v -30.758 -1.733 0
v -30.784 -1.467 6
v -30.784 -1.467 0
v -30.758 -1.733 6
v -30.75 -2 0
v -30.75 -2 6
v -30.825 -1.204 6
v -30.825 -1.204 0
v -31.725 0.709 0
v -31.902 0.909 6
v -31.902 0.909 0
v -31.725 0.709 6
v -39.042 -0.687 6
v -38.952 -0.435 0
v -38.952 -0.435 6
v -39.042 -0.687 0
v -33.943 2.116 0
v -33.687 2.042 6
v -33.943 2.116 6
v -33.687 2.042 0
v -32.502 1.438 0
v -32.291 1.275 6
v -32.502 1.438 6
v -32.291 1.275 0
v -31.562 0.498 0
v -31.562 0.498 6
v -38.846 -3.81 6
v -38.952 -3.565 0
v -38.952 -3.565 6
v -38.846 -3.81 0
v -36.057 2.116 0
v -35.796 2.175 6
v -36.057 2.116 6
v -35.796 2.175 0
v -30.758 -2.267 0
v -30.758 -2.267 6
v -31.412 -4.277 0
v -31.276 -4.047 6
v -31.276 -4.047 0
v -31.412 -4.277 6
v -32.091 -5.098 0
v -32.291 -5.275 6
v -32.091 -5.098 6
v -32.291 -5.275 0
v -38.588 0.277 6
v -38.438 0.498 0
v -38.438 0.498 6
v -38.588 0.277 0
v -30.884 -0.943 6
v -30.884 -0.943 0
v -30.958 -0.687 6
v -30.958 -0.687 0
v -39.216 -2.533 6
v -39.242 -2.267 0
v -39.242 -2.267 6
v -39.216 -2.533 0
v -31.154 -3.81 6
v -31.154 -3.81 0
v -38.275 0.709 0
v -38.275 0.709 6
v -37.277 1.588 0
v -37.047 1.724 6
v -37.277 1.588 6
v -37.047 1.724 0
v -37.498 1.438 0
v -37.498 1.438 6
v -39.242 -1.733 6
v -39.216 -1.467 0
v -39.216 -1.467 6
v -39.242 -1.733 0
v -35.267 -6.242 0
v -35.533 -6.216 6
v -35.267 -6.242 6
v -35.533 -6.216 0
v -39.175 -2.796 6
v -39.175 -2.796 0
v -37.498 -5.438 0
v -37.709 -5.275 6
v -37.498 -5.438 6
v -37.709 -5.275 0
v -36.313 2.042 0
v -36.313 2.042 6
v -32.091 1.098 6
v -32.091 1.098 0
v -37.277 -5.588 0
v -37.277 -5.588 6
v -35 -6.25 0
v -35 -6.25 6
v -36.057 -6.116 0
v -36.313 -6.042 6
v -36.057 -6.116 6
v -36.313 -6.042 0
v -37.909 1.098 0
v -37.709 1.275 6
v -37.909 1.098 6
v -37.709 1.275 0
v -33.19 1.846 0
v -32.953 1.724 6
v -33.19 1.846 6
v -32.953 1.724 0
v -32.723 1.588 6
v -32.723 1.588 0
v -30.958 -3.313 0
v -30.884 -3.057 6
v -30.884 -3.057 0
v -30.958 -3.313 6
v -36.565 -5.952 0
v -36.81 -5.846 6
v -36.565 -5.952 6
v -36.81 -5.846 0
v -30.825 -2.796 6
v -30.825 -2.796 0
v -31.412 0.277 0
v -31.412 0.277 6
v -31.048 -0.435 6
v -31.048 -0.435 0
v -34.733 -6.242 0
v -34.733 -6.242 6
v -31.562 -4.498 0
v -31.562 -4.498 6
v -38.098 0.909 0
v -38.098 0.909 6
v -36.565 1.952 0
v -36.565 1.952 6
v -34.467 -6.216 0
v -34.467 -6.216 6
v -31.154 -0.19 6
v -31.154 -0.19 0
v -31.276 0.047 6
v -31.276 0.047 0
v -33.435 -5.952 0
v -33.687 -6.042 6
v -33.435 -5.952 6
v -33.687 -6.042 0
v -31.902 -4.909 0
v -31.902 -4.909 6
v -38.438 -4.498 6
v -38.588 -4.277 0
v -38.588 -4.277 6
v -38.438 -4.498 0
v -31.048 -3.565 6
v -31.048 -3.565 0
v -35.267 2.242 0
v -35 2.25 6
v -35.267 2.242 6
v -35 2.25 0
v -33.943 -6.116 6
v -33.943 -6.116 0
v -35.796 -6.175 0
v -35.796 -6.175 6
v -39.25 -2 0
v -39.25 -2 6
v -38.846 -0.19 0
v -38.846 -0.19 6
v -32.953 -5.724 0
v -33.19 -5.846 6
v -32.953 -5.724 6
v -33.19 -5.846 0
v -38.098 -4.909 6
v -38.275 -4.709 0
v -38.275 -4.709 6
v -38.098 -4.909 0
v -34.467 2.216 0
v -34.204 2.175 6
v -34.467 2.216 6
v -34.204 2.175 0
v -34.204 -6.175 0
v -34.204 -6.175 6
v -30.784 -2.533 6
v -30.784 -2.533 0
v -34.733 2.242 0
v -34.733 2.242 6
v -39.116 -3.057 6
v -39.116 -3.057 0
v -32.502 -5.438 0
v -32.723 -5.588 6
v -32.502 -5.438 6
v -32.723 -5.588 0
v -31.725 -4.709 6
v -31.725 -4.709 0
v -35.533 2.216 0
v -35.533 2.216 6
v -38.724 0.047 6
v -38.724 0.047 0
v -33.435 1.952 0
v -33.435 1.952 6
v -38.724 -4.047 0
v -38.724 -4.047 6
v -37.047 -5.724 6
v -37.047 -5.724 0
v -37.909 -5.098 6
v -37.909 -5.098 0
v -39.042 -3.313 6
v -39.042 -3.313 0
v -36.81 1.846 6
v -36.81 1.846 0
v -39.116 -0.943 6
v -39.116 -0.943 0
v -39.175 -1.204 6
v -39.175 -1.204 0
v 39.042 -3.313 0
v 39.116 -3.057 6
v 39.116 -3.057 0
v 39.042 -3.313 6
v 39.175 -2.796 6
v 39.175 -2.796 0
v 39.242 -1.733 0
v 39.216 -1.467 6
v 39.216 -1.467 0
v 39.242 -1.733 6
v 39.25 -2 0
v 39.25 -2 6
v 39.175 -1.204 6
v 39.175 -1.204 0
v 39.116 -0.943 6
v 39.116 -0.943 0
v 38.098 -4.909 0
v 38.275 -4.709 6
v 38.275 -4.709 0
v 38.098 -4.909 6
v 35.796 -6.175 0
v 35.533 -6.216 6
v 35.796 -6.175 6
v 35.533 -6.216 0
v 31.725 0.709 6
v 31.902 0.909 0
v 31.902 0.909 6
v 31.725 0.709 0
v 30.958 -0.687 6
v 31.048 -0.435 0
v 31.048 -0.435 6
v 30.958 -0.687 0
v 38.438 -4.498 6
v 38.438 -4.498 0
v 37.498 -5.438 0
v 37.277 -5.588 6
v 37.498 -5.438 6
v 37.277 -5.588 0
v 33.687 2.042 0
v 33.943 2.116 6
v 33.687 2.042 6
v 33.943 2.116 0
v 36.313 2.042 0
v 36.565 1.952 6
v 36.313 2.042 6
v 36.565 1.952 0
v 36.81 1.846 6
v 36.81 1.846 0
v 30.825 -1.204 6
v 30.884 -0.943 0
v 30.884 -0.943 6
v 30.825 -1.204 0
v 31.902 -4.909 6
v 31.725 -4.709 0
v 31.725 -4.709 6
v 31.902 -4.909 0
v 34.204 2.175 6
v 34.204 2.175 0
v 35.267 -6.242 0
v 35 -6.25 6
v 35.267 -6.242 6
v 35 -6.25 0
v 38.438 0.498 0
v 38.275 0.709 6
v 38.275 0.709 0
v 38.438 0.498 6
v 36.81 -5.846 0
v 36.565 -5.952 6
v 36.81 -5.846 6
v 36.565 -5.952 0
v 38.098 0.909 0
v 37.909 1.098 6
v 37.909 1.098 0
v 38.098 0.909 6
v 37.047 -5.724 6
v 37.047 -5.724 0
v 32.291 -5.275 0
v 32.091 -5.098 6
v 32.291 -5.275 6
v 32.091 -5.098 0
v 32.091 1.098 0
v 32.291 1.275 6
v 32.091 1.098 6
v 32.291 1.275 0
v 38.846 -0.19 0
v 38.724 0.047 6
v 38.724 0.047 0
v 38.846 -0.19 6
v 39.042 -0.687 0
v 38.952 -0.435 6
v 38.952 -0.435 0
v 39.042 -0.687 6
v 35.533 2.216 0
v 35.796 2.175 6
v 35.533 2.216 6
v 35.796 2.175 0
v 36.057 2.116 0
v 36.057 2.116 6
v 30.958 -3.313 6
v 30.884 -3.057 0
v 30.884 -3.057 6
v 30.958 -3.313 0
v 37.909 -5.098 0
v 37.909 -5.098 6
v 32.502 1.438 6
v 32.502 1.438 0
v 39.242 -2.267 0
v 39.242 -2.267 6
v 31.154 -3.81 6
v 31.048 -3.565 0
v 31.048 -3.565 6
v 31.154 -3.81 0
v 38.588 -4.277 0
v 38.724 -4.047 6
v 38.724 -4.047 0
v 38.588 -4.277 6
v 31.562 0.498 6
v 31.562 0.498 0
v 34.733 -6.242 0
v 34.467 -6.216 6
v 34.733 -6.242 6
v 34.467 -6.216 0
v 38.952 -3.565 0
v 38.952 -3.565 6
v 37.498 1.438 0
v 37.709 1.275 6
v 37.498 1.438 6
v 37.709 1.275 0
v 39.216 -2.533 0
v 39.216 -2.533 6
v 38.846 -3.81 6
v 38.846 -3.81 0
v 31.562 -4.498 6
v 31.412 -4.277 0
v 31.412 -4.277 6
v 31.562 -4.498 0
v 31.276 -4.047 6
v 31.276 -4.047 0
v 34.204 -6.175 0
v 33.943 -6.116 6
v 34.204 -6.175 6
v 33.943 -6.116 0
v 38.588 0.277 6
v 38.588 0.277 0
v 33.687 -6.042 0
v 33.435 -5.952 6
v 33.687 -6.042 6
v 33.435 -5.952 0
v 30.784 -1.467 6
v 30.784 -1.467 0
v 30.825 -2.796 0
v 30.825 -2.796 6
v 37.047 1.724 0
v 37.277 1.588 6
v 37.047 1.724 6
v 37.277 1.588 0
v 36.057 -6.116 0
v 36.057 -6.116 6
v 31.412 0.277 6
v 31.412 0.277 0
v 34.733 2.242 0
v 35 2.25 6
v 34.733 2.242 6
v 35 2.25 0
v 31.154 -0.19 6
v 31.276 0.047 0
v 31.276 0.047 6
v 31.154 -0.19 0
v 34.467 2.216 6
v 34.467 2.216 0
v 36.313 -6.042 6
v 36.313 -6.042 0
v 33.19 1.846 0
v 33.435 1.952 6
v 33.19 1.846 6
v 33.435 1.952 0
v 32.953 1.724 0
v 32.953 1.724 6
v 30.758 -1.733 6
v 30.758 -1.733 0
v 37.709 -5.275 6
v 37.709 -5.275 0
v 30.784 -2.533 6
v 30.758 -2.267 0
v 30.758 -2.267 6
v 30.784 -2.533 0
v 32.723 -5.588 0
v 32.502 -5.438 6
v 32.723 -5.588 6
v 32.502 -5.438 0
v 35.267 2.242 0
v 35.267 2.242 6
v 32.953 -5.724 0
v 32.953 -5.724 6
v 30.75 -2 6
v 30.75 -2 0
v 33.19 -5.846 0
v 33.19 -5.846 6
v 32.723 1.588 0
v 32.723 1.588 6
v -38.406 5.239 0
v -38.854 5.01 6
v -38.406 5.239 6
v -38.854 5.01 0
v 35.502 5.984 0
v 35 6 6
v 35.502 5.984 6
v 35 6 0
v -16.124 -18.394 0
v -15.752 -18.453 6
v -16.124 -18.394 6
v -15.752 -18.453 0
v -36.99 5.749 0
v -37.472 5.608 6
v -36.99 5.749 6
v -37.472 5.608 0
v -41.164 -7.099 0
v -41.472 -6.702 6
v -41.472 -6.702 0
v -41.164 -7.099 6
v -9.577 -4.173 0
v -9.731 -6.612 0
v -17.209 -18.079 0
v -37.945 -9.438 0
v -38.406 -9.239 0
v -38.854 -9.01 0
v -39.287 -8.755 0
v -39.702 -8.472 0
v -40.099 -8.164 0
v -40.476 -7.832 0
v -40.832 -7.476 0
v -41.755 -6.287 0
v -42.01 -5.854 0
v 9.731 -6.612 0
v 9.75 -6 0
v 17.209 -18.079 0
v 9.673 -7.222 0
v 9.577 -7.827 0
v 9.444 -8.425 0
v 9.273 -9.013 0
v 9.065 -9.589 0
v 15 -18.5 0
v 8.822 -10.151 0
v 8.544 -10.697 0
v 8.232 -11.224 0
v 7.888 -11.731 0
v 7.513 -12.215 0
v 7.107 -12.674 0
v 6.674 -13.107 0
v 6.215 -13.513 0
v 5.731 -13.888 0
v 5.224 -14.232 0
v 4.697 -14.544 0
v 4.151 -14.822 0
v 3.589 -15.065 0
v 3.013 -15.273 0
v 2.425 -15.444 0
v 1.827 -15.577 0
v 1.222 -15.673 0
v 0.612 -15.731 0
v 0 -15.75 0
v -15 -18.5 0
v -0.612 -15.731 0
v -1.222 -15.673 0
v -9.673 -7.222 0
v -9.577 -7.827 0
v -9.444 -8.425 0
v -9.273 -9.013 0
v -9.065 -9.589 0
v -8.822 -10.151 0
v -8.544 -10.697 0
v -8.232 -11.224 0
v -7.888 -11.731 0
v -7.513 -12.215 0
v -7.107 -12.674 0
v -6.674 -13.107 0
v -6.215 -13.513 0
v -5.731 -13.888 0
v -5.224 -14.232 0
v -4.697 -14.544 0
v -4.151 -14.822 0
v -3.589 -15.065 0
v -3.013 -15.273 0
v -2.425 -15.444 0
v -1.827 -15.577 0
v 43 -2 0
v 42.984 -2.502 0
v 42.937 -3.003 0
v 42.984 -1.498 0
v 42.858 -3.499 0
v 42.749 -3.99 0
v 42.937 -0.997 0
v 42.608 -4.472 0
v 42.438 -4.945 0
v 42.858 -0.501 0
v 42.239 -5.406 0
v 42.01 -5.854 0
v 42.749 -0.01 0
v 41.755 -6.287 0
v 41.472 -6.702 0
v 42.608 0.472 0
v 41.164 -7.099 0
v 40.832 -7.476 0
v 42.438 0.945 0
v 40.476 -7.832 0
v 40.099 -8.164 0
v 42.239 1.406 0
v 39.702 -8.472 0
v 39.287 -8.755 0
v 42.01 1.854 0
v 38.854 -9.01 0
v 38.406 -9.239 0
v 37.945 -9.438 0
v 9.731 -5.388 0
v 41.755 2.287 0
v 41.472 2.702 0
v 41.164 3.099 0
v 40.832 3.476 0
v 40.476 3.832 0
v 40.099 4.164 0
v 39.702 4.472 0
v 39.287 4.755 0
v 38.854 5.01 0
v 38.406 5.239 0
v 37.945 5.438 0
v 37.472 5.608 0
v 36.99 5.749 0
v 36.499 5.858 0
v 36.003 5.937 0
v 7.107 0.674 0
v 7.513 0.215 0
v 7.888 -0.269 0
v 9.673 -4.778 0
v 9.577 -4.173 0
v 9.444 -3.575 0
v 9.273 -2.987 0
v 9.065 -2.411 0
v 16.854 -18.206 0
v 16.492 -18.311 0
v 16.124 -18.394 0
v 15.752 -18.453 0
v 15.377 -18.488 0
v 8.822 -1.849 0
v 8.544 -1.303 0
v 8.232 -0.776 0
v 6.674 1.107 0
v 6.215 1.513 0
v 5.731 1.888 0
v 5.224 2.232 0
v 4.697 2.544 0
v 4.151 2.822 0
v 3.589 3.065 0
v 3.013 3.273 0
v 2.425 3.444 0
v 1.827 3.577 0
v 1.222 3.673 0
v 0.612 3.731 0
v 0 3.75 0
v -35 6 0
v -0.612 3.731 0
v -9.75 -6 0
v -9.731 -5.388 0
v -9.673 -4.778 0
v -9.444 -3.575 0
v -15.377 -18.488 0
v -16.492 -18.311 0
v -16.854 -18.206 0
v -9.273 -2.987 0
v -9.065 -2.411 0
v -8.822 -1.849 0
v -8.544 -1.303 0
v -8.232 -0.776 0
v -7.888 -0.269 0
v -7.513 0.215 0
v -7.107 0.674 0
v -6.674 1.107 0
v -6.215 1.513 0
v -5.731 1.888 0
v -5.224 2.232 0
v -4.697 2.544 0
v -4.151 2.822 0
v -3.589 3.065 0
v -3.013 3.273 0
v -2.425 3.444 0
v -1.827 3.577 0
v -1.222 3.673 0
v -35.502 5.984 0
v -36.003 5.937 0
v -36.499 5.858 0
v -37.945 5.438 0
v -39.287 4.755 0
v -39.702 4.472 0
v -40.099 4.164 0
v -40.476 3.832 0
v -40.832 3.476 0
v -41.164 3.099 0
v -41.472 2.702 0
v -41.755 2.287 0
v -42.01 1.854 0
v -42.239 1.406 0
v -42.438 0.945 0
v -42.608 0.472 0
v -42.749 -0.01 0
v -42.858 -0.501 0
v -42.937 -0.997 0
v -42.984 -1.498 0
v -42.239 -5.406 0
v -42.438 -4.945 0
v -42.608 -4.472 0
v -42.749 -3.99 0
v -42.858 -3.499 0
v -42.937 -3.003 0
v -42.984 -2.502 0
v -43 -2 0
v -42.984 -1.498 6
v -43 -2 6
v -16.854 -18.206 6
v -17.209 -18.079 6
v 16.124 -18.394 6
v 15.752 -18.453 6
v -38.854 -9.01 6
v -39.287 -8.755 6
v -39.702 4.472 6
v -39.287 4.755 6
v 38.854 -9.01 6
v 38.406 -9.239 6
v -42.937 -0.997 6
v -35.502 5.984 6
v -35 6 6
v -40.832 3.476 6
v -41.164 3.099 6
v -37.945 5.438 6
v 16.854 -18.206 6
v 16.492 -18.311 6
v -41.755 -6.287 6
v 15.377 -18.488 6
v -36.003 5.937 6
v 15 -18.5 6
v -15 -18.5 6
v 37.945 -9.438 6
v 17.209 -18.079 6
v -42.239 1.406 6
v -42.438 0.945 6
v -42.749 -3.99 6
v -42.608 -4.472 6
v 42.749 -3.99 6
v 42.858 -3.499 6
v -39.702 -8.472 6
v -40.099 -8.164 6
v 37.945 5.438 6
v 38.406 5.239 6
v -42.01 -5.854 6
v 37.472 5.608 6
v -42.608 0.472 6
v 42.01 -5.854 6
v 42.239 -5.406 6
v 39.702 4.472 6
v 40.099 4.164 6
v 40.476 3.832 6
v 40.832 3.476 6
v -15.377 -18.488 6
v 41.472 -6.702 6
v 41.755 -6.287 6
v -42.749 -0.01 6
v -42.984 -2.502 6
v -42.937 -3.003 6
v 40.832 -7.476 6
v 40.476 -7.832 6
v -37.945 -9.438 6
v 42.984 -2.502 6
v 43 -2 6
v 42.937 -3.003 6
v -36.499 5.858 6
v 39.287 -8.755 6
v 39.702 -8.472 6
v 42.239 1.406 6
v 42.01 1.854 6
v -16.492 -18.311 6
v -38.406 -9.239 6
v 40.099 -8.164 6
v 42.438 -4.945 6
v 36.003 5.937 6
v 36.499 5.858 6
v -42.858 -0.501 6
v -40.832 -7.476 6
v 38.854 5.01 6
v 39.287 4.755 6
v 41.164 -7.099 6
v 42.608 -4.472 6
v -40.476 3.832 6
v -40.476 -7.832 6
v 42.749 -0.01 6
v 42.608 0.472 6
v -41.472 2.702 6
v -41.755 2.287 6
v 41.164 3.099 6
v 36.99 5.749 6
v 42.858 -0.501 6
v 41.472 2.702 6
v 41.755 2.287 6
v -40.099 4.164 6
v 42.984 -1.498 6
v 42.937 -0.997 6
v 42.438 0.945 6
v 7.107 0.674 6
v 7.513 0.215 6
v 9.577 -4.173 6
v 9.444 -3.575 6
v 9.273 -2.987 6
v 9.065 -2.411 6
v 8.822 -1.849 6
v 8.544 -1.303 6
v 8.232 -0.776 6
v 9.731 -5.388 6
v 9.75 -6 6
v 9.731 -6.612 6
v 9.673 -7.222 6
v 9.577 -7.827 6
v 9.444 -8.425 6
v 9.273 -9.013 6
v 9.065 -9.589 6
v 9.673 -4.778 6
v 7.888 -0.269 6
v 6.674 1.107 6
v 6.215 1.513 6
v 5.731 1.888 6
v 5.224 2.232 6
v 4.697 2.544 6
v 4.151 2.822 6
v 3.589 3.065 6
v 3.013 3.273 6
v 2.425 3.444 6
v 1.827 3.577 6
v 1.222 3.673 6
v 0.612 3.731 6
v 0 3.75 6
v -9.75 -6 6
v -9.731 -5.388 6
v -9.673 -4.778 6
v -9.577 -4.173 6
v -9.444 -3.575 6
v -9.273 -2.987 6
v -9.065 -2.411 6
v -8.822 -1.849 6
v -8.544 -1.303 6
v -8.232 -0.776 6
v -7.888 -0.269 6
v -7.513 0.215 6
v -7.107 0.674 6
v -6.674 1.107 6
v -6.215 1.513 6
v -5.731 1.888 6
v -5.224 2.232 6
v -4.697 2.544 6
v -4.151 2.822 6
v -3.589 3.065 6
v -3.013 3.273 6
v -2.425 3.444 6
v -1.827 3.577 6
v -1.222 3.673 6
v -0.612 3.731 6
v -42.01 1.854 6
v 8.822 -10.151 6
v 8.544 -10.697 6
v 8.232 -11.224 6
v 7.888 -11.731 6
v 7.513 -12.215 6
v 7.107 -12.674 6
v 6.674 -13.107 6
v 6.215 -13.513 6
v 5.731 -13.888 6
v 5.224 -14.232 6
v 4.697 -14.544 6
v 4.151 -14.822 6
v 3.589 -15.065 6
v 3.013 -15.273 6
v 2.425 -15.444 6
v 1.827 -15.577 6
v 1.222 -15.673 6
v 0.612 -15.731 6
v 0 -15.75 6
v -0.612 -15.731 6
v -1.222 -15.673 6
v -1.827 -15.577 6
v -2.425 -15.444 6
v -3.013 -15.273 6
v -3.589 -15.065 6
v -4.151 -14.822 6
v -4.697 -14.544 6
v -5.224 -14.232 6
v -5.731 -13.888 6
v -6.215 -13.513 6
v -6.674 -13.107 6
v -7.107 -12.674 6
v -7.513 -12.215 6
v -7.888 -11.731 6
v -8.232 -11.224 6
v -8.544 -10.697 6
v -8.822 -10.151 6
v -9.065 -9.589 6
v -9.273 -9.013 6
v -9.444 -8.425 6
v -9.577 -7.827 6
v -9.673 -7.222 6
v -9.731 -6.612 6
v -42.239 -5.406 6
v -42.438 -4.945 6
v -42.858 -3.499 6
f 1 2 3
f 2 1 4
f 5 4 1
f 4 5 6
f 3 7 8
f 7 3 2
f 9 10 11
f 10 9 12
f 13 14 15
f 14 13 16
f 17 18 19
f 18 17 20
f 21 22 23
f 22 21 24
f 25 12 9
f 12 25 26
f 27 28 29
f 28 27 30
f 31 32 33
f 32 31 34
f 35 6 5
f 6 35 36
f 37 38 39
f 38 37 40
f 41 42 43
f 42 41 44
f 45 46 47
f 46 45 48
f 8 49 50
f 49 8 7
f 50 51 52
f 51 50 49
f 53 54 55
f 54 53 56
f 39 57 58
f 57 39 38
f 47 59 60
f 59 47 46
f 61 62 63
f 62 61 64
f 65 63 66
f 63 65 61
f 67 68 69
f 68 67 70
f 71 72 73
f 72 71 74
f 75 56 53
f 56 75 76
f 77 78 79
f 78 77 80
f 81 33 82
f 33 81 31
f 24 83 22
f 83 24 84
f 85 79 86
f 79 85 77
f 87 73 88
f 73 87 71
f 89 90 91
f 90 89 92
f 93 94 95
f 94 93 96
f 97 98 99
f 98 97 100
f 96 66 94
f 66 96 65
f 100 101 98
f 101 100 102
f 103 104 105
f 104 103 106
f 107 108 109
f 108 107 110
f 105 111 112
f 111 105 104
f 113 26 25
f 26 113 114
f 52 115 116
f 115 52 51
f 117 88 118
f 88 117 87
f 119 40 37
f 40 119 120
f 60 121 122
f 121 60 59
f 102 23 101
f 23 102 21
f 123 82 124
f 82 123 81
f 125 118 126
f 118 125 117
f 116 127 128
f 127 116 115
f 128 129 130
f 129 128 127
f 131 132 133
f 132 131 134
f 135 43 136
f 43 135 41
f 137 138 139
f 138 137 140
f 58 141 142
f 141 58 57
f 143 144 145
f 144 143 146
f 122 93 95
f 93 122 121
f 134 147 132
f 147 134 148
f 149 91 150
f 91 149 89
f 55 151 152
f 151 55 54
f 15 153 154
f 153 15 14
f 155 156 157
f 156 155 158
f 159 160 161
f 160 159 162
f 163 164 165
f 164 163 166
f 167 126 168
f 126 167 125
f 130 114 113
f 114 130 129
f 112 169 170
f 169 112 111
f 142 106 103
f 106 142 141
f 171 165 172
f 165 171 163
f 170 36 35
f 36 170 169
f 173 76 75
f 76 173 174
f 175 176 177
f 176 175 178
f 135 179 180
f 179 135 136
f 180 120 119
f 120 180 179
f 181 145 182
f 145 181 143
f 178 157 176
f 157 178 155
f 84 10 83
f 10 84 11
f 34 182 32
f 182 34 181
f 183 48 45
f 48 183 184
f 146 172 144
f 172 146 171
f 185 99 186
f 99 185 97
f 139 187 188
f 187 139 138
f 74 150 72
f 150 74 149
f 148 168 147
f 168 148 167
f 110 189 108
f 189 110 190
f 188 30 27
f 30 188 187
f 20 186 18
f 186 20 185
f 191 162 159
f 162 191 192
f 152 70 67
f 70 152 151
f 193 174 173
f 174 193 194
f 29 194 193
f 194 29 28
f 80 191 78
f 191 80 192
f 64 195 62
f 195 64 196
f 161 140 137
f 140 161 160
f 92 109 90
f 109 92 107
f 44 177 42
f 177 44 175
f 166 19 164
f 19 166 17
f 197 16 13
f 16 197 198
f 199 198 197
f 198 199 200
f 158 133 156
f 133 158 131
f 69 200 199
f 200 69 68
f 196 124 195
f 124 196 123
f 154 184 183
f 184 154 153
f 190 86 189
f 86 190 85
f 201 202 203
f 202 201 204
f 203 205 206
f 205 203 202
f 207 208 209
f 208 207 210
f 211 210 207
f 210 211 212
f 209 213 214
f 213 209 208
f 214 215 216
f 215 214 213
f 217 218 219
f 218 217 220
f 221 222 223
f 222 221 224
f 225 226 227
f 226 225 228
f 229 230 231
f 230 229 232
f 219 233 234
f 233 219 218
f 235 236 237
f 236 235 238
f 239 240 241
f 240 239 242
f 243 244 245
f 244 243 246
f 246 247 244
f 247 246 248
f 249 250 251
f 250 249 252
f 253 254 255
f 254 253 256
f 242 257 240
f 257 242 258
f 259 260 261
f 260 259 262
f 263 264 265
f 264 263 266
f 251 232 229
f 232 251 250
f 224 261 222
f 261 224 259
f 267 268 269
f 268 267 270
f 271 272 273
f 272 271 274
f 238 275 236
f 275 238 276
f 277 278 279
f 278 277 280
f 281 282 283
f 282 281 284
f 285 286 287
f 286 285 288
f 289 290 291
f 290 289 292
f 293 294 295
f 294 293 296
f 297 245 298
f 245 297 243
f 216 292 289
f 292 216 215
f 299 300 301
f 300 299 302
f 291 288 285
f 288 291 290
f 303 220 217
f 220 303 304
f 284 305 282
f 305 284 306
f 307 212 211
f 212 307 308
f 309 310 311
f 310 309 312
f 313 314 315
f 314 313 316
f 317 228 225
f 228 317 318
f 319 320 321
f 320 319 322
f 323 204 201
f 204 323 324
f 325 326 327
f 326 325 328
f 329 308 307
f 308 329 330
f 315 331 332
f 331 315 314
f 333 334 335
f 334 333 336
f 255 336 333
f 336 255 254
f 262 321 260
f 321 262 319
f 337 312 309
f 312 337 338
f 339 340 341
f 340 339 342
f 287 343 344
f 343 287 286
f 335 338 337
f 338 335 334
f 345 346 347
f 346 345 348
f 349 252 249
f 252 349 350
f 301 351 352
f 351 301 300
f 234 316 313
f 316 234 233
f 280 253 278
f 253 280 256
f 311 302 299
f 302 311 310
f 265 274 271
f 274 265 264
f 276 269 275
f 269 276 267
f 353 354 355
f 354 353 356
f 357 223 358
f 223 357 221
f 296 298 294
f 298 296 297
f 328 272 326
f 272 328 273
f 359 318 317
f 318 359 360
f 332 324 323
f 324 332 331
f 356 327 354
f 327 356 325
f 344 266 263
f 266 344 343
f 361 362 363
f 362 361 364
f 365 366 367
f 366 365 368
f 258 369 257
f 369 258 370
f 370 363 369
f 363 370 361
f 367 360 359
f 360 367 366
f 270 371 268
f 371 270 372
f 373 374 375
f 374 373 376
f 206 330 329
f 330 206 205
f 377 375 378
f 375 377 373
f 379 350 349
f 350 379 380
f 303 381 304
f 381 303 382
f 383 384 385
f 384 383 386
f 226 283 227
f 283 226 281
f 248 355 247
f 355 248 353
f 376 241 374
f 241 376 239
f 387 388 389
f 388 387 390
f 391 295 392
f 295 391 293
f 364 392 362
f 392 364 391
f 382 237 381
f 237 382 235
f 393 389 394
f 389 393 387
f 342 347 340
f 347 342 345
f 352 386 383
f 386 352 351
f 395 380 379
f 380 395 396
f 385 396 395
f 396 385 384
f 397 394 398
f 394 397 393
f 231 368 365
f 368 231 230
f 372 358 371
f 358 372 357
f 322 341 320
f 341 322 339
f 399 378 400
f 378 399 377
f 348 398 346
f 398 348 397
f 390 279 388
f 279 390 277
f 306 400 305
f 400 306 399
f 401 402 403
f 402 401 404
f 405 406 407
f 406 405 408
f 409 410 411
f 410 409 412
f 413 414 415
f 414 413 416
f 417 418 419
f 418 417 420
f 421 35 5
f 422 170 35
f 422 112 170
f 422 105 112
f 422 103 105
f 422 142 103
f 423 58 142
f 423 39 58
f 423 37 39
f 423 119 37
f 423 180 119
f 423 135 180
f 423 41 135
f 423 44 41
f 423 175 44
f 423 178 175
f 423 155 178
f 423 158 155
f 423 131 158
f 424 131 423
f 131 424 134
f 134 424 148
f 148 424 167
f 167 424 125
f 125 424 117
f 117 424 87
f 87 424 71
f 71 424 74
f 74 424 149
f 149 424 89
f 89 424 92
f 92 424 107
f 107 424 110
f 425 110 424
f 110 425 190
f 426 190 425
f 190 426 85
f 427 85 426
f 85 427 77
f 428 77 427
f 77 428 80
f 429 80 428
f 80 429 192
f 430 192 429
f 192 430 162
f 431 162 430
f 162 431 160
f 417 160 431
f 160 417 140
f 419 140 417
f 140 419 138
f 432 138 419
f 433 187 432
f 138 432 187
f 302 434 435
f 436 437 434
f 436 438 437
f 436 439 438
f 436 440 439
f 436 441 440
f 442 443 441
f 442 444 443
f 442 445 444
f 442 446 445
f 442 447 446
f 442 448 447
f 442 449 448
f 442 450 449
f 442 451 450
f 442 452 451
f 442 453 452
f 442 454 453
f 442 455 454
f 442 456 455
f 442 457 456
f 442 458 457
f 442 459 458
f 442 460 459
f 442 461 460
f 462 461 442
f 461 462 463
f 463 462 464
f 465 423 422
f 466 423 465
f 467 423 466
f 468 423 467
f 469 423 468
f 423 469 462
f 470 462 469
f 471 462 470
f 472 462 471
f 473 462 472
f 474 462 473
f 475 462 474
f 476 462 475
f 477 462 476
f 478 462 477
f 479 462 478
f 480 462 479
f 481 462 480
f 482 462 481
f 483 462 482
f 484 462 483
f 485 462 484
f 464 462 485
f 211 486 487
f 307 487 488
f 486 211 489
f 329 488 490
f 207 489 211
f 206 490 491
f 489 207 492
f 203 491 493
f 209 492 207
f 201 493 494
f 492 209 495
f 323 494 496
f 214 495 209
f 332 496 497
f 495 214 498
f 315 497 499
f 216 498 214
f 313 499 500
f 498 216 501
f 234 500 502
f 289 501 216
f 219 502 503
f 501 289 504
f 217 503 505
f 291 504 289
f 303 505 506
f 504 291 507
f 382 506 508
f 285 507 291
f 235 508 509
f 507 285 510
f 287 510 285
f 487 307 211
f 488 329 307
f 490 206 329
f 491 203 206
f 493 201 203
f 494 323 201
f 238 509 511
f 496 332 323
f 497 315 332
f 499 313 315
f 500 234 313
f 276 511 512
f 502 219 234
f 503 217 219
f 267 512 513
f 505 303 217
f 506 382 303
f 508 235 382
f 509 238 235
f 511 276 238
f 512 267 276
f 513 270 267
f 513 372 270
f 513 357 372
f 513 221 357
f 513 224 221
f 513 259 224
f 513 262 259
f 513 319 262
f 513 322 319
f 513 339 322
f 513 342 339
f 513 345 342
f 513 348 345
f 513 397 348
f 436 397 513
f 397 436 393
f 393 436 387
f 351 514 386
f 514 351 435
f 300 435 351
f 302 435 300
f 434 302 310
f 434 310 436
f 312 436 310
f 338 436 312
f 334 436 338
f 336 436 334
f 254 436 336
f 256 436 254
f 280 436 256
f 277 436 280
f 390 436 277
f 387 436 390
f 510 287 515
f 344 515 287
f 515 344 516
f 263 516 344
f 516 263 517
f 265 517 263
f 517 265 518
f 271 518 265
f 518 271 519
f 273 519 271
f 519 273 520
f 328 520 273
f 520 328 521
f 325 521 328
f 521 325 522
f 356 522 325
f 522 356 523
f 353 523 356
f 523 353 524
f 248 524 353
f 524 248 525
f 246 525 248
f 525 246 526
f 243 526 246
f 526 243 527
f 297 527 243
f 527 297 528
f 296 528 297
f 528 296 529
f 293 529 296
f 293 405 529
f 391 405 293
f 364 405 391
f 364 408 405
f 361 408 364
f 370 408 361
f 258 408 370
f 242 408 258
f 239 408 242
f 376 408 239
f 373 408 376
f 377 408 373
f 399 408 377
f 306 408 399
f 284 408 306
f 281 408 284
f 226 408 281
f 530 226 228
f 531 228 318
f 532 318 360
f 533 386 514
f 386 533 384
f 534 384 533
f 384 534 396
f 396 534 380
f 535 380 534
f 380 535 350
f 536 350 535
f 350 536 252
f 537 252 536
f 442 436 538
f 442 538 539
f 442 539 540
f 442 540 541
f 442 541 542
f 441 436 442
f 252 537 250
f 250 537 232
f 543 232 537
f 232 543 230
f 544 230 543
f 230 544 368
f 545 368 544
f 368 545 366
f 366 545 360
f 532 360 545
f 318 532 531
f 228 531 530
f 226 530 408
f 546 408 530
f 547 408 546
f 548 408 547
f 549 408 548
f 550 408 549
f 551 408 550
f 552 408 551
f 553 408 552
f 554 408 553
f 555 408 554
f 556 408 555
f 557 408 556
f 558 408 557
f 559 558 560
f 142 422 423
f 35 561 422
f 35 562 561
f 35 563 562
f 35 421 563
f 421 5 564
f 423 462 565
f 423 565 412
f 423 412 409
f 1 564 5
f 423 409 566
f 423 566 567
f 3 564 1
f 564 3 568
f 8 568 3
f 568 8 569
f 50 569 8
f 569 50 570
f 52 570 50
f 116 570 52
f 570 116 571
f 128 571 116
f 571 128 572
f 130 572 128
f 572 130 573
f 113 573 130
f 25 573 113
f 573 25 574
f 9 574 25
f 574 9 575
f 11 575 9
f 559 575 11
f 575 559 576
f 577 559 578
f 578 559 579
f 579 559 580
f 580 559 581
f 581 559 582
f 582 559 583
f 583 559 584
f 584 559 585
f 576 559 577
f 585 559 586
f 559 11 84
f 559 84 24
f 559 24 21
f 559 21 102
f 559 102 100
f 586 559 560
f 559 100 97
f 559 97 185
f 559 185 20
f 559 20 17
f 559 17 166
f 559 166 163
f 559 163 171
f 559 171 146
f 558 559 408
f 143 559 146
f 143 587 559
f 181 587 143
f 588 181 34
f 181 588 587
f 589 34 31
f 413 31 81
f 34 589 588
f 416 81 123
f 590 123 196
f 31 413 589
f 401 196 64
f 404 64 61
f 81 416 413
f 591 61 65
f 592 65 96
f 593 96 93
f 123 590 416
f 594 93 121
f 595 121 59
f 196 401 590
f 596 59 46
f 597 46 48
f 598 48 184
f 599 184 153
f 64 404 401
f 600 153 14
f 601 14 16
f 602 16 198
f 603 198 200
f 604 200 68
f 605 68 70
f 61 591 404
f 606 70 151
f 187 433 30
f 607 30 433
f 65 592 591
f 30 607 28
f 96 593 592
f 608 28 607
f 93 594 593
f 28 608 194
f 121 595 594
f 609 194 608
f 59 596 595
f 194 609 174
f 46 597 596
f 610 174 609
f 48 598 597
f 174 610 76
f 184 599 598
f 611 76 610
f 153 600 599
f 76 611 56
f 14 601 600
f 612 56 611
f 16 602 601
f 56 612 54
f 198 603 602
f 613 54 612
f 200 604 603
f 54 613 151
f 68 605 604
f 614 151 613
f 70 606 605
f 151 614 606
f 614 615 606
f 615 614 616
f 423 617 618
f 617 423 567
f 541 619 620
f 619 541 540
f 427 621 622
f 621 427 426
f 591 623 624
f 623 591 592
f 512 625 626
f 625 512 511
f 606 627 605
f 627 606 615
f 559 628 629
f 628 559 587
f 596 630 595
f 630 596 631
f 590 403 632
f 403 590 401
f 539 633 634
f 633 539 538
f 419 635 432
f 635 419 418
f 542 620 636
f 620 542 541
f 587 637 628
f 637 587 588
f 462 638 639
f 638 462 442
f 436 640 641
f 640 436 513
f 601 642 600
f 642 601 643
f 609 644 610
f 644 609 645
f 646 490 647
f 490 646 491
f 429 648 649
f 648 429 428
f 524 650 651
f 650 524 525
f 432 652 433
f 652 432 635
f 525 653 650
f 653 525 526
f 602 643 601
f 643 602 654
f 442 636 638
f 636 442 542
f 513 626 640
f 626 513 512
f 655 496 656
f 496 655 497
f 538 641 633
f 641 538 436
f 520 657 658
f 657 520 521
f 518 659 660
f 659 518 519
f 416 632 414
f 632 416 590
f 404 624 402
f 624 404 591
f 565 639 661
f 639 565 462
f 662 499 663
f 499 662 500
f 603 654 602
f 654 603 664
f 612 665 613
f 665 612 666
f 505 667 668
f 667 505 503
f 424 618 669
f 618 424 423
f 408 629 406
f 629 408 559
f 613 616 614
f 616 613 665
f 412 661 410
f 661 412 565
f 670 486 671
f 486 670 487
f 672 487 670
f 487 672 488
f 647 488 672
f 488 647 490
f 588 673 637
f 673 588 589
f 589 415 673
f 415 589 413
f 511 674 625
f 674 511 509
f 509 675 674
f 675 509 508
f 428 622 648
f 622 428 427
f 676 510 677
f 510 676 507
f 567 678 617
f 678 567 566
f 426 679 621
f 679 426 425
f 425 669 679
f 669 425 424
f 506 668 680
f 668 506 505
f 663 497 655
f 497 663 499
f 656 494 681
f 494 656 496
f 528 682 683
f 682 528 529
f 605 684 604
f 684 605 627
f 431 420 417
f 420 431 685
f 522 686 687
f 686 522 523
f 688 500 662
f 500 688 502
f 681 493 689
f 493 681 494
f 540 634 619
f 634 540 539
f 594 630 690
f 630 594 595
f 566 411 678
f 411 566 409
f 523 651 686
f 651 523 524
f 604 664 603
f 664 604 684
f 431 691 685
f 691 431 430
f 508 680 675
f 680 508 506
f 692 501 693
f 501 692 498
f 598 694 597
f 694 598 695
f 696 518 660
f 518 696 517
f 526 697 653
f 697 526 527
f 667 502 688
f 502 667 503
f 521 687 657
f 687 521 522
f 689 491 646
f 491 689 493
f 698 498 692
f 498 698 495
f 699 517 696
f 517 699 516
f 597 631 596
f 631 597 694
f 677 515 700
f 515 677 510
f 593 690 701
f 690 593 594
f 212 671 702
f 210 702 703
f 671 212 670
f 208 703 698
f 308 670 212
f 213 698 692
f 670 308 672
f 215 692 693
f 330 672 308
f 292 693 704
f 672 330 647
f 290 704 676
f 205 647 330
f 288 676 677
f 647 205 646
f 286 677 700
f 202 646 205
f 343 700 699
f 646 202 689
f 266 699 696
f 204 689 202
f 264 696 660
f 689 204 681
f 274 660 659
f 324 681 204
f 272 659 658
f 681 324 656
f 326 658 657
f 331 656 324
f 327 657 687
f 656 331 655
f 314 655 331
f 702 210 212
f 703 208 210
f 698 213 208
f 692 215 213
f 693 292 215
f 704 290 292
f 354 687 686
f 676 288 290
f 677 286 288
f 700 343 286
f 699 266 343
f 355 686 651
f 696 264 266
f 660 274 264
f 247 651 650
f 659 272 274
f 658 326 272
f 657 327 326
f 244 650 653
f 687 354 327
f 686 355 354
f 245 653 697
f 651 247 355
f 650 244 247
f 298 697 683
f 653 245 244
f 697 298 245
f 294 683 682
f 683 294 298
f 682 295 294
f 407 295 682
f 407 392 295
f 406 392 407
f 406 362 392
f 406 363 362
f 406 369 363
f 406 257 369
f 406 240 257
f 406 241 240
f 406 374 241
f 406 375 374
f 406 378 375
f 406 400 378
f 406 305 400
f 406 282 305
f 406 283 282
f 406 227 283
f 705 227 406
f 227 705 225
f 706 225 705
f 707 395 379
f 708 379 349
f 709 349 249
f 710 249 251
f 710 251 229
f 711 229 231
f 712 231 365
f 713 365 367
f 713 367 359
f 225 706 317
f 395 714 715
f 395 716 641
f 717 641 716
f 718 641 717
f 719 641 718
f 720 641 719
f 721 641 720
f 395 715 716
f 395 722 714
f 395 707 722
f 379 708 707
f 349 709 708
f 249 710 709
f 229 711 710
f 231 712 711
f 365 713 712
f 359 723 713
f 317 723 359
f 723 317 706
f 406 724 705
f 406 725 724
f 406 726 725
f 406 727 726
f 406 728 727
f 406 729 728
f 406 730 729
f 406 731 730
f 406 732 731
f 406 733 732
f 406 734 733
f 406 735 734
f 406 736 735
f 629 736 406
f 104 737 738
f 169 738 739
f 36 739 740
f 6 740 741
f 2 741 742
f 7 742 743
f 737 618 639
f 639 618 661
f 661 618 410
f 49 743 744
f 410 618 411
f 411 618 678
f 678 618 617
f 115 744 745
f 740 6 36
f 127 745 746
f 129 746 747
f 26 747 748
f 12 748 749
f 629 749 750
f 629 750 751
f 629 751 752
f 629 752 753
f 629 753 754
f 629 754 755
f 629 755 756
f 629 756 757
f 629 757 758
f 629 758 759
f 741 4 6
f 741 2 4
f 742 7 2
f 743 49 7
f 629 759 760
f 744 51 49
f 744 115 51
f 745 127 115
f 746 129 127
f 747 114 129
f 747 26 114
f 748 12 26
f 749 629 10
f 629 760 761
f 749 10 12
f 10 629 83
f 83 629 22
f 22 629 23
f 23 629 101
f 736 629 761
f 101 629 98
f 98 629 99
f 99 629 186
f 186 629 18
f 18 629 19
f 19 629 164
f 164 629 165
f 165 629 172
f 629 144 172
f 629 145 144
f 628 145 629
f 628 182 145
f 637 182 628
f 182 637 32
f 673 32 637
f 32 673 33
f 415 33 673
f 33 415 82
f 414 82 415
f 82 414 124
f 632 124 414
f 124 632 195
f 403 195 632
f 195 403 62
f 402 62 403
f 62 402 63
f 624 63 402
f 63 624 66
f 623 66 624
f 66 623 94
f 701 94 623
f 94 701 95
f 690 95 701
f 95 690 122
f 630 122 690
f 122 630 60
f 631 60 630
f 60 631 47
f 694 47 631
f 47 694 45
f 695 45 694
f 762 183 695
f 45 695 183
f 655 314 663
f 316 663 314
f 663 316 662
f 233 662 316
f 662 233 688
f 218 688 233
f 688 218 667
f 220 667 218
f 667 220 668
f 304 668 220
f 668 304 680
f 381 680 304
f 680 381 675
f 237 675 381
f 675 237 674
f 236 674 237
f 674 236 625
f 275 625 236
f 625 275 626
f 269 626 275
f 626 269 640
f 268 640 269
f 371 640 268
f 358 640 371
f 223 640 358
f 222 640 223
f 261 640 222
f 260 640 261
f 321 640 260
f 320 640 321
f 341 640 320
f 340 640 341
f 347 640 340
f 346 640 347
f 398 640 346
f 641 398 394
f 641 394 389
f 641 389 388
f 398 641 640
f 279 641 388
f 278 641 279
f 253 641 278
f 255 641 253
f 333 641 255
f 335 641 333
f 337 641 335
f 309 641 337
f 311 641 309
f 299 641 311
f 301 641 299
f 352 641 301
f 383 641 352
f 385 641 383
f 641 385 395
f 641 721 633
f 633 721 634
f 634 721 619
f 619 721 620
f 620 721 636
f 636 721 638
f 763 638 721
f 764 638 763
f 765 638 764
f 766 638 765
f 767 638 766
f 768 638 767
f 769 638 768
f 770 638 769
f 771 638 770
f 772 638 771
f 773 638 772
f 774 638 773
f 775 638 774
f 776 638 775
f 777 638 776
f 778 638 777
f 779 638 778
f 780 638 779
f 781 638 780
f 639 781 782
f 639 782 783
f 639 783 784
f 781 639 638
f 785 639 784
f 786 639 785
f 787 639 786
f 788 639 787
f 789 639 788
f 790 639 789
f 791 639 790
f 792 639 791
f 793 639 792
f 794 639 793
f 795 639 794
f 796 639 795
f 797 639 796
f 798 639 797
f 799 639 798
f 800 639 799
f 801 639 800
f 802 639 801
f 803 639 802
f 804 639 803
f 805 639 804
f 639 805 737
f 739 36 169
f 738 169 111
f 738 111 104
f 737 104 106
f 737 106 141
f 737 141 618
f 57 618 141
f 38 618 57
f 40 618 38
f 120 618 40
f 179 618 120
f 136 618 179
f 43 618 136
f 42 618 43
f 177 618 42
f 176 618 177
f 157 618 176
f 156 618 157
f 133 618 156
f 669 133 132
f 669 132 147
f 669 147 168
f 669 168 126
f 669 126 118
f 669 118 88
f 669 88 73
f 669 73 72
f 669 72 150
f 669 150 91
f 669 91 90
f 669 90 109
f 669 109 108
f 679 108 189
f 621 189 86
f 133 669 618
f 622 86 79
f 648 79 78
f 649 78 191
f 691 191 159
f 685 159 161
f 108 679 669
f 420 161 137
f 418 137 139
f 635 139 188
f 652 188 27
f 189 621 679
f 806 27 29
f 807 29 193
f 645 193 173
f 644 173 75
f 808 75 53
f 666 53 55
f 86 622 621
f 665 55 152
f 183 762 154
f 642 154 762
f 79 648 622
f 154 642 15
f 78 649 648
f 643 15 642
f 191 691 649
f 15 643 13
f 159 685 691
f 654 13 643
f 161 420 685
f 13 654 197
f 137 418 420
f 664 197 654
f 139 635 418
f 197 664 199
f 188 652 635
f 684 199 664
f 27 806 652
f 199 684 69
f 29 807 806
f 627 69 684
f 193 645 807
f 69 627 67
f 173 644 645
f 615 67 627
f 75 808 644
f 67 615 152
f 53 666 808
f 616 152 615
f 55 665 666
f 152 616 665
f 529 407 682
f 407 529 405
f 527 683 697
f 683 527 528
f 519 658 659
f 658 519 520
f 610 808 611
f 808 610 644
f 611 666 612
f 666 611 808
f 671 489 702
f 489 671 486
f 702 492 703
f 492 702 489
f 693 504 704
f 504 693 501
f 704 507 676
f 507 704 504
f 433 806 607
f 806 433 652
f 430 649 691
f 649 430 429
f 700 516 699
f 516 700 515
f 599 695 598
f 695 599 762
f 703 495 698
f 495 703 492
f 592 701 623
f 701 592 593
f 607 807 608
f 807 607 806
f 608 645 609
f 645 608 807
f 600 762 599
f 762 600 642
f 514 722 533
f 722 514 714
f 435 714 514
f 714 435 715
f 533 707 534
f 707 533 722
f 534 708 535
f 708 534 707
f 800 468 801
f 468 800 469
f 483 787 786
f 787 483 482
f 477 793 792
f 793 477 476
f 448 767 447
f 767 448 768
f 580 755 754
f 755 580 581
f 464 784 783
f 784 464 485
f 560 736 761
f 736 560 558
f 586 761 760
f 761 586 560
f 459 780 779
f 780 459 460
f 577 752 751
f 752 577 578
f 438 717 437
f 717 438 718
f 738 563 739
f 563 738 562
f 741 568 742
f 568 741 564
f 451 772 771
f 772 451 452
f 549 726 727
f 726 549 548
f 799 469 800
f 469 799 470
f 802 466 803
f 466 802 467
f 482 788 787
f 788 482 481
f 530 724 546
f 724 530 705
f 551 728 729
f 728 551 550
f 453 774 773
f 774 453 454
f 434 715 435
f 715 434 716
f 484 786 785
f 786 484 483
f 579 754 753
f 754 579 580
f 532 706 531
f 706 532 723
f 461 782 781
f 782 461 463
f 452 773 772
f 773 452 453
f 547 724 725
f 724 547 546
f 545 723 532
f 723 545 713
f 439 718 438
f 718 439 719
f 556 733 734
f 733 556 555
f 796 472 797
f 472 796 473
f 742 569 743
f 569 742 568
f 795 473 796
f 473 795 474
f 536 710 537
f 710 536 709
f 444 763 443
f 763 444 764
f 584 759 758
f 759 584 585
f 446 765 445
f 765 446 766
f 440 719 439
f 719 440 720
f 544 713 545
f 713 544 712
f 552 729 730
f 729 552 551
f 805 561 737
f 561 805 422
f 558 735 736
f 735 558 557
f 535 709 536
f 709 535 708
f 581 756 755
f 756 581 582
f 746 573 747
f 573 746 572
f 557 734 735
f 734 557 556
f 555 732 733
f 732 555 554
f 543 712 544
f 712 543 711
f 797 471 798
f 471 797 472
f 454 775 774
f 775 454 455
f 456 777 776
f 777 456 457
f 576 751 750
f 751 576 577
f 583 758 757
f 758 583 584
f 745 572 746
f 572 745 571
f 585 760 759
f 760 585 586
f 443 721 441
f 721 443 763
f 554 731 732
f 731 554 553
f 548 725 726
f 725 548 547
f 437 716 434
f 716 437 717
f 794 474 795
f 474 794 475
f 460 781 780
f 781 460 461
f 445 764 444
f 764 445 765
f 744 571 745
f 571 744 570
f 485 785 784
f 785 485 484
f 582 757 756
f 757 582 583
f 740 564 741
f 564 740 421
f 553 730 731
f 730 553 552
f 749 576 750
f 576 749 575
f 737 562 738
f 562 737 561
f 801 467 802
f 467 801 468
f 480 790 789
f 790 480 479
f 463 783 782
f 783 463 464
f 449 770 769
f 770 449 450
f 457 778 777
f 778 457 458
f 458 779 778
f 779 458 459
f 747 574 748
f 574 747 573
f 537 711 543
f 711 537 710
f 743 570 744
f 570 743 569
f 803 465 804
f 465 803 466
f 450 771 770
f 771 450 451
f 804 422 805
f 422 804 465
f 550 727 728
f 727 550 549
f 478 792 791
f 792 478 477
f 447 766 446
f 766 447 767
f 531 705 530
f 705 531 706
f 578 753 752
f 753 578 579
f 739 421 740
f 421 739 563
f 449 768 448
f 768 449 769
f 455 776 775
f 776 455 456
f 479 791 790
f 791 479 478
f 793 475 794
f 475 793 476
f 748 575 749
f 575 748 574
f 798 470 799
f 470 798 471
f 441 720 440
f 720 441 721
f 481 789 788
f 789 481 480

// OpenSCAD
$fn=100;

slider_headroom = 10;
module bearing_holder()
{ 
    difference()
    {
        hull()
        {
            for(i=[-15,15])
                translate([i,-2.5 - slider_headroom,0])
                    cylinder(d=12,h=6);
            for(i=[-35,35])
                translate([i,-2,0])
                    cylinder(d=16,h=6); 
        }
        for(i=[-35,35])
            translate([i,-2,-0.001])
                cylinder(d=8.5,h=6.002);
        translate([0,-6,-0.001])
            cylinder(d=19.5,h=6.002);
    }
}

bearing_holder();
